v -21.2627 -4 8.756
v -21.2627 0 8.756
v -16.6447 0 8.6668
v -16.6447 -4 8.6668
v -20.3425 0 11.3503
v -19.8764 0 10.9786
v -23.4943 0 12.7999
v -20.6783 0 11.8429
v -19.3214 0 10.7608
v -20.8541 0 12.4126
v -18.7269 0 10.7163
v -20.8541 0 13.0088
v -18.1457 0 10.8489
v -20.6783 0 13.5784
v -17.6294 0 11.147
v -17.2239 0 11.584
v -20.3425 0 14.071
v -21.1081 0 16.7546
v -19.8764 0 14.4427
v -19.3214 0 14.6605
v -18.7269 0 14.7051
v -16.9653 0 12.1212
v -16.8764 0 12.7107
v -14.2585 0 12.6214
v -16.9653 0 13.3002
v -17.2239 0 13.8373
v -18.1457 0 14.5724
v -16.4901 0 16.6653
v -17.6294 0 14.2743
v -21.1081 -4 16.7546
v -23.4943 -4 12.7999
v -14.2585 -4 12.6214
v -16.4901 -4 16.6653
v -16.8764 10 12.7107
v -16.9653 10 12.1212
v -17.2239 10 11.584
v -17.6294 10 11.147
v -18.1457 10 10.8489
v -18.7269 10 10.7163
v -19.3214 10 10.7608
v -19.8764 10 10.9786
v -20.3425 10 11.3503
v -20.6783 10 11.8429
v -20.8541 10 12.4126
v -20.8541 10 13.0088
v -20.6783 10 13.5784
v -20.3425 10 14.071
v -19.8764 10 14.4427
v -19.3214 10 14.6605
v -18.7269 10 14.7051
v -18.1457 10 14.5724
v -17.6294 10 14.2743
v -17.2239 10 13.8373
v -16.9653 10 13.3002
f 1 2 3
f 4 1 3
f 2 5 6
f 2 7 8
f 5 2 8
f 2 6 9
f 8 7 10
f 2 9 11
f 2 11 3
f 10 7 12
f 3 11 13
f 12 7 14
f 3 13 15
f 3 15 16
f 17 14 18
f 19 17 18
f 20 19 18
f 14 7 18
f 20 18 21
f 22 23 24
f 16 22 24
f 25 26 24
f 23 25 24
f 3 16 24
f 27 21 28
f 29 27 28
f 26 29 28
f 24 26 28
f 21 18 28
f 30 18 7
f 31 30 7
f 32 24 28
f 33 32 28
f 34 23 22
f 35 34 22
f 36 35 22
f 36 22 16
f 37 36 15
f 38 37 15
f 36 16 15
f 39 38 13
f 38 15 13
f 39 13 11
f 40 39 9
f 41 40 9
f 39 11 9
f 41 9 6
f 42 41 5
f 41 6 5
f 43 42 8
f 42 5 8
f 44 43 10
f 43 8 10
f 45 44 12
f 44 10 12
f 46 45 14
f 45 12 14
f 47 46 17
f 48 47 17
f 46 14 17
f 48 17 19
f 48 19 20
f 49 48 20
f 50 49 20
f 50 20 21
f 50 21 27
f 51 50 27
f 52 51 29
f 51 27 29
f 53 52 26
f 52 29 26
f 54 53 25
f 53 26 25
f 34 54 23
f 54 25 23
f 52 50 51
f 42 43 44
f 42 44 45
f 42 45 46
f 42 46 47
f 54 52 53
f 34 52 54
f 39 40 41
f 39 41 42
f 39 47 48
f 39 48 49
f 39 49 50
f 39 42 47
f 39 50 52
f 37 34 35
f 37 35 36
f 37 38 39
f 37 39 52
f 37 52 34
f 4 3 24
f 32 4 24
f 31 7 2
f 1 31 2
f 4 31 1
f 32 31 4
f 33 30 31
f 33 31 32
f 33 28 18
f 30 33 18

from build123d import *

# Parameters (mm, degrees)
SKETCH1_R           = 2
BOSS_EXTRUDE1_DEPTH = 10
BOSS_EXTRUDE4_DEPTH = 4


with BuildPart() as part:
    # Sketch1 → Boss-Extrude1 (new body)
    with BuildSketch(Plane(origin=(0, 0, 0), x_dir=(1, 0, 0), z_dir=(0, 1, 0))):
        with Locations((-18.876405997, -12.710678642)):
            Circle(SKETCH1_R)
    extrude(amount=BOSS_EXTRUDE1_DEPTH)

    # Sketch4 → Boss-Extrude4 (add)
    with BuildSketch(Plane.XZ):
        Polygon((-16.490145939, 16.665308368), (-21.108085773, 16.754555336), (-23.494345831, 12.79992561), (-21.262666056, 8.756048917), (-16.644726221, 8.666801949), (-14.258466163, 12.621431674), align=None)
    extrude(amount=BOSS_EXTRUDE4_DEPTH)


solid = part.part
